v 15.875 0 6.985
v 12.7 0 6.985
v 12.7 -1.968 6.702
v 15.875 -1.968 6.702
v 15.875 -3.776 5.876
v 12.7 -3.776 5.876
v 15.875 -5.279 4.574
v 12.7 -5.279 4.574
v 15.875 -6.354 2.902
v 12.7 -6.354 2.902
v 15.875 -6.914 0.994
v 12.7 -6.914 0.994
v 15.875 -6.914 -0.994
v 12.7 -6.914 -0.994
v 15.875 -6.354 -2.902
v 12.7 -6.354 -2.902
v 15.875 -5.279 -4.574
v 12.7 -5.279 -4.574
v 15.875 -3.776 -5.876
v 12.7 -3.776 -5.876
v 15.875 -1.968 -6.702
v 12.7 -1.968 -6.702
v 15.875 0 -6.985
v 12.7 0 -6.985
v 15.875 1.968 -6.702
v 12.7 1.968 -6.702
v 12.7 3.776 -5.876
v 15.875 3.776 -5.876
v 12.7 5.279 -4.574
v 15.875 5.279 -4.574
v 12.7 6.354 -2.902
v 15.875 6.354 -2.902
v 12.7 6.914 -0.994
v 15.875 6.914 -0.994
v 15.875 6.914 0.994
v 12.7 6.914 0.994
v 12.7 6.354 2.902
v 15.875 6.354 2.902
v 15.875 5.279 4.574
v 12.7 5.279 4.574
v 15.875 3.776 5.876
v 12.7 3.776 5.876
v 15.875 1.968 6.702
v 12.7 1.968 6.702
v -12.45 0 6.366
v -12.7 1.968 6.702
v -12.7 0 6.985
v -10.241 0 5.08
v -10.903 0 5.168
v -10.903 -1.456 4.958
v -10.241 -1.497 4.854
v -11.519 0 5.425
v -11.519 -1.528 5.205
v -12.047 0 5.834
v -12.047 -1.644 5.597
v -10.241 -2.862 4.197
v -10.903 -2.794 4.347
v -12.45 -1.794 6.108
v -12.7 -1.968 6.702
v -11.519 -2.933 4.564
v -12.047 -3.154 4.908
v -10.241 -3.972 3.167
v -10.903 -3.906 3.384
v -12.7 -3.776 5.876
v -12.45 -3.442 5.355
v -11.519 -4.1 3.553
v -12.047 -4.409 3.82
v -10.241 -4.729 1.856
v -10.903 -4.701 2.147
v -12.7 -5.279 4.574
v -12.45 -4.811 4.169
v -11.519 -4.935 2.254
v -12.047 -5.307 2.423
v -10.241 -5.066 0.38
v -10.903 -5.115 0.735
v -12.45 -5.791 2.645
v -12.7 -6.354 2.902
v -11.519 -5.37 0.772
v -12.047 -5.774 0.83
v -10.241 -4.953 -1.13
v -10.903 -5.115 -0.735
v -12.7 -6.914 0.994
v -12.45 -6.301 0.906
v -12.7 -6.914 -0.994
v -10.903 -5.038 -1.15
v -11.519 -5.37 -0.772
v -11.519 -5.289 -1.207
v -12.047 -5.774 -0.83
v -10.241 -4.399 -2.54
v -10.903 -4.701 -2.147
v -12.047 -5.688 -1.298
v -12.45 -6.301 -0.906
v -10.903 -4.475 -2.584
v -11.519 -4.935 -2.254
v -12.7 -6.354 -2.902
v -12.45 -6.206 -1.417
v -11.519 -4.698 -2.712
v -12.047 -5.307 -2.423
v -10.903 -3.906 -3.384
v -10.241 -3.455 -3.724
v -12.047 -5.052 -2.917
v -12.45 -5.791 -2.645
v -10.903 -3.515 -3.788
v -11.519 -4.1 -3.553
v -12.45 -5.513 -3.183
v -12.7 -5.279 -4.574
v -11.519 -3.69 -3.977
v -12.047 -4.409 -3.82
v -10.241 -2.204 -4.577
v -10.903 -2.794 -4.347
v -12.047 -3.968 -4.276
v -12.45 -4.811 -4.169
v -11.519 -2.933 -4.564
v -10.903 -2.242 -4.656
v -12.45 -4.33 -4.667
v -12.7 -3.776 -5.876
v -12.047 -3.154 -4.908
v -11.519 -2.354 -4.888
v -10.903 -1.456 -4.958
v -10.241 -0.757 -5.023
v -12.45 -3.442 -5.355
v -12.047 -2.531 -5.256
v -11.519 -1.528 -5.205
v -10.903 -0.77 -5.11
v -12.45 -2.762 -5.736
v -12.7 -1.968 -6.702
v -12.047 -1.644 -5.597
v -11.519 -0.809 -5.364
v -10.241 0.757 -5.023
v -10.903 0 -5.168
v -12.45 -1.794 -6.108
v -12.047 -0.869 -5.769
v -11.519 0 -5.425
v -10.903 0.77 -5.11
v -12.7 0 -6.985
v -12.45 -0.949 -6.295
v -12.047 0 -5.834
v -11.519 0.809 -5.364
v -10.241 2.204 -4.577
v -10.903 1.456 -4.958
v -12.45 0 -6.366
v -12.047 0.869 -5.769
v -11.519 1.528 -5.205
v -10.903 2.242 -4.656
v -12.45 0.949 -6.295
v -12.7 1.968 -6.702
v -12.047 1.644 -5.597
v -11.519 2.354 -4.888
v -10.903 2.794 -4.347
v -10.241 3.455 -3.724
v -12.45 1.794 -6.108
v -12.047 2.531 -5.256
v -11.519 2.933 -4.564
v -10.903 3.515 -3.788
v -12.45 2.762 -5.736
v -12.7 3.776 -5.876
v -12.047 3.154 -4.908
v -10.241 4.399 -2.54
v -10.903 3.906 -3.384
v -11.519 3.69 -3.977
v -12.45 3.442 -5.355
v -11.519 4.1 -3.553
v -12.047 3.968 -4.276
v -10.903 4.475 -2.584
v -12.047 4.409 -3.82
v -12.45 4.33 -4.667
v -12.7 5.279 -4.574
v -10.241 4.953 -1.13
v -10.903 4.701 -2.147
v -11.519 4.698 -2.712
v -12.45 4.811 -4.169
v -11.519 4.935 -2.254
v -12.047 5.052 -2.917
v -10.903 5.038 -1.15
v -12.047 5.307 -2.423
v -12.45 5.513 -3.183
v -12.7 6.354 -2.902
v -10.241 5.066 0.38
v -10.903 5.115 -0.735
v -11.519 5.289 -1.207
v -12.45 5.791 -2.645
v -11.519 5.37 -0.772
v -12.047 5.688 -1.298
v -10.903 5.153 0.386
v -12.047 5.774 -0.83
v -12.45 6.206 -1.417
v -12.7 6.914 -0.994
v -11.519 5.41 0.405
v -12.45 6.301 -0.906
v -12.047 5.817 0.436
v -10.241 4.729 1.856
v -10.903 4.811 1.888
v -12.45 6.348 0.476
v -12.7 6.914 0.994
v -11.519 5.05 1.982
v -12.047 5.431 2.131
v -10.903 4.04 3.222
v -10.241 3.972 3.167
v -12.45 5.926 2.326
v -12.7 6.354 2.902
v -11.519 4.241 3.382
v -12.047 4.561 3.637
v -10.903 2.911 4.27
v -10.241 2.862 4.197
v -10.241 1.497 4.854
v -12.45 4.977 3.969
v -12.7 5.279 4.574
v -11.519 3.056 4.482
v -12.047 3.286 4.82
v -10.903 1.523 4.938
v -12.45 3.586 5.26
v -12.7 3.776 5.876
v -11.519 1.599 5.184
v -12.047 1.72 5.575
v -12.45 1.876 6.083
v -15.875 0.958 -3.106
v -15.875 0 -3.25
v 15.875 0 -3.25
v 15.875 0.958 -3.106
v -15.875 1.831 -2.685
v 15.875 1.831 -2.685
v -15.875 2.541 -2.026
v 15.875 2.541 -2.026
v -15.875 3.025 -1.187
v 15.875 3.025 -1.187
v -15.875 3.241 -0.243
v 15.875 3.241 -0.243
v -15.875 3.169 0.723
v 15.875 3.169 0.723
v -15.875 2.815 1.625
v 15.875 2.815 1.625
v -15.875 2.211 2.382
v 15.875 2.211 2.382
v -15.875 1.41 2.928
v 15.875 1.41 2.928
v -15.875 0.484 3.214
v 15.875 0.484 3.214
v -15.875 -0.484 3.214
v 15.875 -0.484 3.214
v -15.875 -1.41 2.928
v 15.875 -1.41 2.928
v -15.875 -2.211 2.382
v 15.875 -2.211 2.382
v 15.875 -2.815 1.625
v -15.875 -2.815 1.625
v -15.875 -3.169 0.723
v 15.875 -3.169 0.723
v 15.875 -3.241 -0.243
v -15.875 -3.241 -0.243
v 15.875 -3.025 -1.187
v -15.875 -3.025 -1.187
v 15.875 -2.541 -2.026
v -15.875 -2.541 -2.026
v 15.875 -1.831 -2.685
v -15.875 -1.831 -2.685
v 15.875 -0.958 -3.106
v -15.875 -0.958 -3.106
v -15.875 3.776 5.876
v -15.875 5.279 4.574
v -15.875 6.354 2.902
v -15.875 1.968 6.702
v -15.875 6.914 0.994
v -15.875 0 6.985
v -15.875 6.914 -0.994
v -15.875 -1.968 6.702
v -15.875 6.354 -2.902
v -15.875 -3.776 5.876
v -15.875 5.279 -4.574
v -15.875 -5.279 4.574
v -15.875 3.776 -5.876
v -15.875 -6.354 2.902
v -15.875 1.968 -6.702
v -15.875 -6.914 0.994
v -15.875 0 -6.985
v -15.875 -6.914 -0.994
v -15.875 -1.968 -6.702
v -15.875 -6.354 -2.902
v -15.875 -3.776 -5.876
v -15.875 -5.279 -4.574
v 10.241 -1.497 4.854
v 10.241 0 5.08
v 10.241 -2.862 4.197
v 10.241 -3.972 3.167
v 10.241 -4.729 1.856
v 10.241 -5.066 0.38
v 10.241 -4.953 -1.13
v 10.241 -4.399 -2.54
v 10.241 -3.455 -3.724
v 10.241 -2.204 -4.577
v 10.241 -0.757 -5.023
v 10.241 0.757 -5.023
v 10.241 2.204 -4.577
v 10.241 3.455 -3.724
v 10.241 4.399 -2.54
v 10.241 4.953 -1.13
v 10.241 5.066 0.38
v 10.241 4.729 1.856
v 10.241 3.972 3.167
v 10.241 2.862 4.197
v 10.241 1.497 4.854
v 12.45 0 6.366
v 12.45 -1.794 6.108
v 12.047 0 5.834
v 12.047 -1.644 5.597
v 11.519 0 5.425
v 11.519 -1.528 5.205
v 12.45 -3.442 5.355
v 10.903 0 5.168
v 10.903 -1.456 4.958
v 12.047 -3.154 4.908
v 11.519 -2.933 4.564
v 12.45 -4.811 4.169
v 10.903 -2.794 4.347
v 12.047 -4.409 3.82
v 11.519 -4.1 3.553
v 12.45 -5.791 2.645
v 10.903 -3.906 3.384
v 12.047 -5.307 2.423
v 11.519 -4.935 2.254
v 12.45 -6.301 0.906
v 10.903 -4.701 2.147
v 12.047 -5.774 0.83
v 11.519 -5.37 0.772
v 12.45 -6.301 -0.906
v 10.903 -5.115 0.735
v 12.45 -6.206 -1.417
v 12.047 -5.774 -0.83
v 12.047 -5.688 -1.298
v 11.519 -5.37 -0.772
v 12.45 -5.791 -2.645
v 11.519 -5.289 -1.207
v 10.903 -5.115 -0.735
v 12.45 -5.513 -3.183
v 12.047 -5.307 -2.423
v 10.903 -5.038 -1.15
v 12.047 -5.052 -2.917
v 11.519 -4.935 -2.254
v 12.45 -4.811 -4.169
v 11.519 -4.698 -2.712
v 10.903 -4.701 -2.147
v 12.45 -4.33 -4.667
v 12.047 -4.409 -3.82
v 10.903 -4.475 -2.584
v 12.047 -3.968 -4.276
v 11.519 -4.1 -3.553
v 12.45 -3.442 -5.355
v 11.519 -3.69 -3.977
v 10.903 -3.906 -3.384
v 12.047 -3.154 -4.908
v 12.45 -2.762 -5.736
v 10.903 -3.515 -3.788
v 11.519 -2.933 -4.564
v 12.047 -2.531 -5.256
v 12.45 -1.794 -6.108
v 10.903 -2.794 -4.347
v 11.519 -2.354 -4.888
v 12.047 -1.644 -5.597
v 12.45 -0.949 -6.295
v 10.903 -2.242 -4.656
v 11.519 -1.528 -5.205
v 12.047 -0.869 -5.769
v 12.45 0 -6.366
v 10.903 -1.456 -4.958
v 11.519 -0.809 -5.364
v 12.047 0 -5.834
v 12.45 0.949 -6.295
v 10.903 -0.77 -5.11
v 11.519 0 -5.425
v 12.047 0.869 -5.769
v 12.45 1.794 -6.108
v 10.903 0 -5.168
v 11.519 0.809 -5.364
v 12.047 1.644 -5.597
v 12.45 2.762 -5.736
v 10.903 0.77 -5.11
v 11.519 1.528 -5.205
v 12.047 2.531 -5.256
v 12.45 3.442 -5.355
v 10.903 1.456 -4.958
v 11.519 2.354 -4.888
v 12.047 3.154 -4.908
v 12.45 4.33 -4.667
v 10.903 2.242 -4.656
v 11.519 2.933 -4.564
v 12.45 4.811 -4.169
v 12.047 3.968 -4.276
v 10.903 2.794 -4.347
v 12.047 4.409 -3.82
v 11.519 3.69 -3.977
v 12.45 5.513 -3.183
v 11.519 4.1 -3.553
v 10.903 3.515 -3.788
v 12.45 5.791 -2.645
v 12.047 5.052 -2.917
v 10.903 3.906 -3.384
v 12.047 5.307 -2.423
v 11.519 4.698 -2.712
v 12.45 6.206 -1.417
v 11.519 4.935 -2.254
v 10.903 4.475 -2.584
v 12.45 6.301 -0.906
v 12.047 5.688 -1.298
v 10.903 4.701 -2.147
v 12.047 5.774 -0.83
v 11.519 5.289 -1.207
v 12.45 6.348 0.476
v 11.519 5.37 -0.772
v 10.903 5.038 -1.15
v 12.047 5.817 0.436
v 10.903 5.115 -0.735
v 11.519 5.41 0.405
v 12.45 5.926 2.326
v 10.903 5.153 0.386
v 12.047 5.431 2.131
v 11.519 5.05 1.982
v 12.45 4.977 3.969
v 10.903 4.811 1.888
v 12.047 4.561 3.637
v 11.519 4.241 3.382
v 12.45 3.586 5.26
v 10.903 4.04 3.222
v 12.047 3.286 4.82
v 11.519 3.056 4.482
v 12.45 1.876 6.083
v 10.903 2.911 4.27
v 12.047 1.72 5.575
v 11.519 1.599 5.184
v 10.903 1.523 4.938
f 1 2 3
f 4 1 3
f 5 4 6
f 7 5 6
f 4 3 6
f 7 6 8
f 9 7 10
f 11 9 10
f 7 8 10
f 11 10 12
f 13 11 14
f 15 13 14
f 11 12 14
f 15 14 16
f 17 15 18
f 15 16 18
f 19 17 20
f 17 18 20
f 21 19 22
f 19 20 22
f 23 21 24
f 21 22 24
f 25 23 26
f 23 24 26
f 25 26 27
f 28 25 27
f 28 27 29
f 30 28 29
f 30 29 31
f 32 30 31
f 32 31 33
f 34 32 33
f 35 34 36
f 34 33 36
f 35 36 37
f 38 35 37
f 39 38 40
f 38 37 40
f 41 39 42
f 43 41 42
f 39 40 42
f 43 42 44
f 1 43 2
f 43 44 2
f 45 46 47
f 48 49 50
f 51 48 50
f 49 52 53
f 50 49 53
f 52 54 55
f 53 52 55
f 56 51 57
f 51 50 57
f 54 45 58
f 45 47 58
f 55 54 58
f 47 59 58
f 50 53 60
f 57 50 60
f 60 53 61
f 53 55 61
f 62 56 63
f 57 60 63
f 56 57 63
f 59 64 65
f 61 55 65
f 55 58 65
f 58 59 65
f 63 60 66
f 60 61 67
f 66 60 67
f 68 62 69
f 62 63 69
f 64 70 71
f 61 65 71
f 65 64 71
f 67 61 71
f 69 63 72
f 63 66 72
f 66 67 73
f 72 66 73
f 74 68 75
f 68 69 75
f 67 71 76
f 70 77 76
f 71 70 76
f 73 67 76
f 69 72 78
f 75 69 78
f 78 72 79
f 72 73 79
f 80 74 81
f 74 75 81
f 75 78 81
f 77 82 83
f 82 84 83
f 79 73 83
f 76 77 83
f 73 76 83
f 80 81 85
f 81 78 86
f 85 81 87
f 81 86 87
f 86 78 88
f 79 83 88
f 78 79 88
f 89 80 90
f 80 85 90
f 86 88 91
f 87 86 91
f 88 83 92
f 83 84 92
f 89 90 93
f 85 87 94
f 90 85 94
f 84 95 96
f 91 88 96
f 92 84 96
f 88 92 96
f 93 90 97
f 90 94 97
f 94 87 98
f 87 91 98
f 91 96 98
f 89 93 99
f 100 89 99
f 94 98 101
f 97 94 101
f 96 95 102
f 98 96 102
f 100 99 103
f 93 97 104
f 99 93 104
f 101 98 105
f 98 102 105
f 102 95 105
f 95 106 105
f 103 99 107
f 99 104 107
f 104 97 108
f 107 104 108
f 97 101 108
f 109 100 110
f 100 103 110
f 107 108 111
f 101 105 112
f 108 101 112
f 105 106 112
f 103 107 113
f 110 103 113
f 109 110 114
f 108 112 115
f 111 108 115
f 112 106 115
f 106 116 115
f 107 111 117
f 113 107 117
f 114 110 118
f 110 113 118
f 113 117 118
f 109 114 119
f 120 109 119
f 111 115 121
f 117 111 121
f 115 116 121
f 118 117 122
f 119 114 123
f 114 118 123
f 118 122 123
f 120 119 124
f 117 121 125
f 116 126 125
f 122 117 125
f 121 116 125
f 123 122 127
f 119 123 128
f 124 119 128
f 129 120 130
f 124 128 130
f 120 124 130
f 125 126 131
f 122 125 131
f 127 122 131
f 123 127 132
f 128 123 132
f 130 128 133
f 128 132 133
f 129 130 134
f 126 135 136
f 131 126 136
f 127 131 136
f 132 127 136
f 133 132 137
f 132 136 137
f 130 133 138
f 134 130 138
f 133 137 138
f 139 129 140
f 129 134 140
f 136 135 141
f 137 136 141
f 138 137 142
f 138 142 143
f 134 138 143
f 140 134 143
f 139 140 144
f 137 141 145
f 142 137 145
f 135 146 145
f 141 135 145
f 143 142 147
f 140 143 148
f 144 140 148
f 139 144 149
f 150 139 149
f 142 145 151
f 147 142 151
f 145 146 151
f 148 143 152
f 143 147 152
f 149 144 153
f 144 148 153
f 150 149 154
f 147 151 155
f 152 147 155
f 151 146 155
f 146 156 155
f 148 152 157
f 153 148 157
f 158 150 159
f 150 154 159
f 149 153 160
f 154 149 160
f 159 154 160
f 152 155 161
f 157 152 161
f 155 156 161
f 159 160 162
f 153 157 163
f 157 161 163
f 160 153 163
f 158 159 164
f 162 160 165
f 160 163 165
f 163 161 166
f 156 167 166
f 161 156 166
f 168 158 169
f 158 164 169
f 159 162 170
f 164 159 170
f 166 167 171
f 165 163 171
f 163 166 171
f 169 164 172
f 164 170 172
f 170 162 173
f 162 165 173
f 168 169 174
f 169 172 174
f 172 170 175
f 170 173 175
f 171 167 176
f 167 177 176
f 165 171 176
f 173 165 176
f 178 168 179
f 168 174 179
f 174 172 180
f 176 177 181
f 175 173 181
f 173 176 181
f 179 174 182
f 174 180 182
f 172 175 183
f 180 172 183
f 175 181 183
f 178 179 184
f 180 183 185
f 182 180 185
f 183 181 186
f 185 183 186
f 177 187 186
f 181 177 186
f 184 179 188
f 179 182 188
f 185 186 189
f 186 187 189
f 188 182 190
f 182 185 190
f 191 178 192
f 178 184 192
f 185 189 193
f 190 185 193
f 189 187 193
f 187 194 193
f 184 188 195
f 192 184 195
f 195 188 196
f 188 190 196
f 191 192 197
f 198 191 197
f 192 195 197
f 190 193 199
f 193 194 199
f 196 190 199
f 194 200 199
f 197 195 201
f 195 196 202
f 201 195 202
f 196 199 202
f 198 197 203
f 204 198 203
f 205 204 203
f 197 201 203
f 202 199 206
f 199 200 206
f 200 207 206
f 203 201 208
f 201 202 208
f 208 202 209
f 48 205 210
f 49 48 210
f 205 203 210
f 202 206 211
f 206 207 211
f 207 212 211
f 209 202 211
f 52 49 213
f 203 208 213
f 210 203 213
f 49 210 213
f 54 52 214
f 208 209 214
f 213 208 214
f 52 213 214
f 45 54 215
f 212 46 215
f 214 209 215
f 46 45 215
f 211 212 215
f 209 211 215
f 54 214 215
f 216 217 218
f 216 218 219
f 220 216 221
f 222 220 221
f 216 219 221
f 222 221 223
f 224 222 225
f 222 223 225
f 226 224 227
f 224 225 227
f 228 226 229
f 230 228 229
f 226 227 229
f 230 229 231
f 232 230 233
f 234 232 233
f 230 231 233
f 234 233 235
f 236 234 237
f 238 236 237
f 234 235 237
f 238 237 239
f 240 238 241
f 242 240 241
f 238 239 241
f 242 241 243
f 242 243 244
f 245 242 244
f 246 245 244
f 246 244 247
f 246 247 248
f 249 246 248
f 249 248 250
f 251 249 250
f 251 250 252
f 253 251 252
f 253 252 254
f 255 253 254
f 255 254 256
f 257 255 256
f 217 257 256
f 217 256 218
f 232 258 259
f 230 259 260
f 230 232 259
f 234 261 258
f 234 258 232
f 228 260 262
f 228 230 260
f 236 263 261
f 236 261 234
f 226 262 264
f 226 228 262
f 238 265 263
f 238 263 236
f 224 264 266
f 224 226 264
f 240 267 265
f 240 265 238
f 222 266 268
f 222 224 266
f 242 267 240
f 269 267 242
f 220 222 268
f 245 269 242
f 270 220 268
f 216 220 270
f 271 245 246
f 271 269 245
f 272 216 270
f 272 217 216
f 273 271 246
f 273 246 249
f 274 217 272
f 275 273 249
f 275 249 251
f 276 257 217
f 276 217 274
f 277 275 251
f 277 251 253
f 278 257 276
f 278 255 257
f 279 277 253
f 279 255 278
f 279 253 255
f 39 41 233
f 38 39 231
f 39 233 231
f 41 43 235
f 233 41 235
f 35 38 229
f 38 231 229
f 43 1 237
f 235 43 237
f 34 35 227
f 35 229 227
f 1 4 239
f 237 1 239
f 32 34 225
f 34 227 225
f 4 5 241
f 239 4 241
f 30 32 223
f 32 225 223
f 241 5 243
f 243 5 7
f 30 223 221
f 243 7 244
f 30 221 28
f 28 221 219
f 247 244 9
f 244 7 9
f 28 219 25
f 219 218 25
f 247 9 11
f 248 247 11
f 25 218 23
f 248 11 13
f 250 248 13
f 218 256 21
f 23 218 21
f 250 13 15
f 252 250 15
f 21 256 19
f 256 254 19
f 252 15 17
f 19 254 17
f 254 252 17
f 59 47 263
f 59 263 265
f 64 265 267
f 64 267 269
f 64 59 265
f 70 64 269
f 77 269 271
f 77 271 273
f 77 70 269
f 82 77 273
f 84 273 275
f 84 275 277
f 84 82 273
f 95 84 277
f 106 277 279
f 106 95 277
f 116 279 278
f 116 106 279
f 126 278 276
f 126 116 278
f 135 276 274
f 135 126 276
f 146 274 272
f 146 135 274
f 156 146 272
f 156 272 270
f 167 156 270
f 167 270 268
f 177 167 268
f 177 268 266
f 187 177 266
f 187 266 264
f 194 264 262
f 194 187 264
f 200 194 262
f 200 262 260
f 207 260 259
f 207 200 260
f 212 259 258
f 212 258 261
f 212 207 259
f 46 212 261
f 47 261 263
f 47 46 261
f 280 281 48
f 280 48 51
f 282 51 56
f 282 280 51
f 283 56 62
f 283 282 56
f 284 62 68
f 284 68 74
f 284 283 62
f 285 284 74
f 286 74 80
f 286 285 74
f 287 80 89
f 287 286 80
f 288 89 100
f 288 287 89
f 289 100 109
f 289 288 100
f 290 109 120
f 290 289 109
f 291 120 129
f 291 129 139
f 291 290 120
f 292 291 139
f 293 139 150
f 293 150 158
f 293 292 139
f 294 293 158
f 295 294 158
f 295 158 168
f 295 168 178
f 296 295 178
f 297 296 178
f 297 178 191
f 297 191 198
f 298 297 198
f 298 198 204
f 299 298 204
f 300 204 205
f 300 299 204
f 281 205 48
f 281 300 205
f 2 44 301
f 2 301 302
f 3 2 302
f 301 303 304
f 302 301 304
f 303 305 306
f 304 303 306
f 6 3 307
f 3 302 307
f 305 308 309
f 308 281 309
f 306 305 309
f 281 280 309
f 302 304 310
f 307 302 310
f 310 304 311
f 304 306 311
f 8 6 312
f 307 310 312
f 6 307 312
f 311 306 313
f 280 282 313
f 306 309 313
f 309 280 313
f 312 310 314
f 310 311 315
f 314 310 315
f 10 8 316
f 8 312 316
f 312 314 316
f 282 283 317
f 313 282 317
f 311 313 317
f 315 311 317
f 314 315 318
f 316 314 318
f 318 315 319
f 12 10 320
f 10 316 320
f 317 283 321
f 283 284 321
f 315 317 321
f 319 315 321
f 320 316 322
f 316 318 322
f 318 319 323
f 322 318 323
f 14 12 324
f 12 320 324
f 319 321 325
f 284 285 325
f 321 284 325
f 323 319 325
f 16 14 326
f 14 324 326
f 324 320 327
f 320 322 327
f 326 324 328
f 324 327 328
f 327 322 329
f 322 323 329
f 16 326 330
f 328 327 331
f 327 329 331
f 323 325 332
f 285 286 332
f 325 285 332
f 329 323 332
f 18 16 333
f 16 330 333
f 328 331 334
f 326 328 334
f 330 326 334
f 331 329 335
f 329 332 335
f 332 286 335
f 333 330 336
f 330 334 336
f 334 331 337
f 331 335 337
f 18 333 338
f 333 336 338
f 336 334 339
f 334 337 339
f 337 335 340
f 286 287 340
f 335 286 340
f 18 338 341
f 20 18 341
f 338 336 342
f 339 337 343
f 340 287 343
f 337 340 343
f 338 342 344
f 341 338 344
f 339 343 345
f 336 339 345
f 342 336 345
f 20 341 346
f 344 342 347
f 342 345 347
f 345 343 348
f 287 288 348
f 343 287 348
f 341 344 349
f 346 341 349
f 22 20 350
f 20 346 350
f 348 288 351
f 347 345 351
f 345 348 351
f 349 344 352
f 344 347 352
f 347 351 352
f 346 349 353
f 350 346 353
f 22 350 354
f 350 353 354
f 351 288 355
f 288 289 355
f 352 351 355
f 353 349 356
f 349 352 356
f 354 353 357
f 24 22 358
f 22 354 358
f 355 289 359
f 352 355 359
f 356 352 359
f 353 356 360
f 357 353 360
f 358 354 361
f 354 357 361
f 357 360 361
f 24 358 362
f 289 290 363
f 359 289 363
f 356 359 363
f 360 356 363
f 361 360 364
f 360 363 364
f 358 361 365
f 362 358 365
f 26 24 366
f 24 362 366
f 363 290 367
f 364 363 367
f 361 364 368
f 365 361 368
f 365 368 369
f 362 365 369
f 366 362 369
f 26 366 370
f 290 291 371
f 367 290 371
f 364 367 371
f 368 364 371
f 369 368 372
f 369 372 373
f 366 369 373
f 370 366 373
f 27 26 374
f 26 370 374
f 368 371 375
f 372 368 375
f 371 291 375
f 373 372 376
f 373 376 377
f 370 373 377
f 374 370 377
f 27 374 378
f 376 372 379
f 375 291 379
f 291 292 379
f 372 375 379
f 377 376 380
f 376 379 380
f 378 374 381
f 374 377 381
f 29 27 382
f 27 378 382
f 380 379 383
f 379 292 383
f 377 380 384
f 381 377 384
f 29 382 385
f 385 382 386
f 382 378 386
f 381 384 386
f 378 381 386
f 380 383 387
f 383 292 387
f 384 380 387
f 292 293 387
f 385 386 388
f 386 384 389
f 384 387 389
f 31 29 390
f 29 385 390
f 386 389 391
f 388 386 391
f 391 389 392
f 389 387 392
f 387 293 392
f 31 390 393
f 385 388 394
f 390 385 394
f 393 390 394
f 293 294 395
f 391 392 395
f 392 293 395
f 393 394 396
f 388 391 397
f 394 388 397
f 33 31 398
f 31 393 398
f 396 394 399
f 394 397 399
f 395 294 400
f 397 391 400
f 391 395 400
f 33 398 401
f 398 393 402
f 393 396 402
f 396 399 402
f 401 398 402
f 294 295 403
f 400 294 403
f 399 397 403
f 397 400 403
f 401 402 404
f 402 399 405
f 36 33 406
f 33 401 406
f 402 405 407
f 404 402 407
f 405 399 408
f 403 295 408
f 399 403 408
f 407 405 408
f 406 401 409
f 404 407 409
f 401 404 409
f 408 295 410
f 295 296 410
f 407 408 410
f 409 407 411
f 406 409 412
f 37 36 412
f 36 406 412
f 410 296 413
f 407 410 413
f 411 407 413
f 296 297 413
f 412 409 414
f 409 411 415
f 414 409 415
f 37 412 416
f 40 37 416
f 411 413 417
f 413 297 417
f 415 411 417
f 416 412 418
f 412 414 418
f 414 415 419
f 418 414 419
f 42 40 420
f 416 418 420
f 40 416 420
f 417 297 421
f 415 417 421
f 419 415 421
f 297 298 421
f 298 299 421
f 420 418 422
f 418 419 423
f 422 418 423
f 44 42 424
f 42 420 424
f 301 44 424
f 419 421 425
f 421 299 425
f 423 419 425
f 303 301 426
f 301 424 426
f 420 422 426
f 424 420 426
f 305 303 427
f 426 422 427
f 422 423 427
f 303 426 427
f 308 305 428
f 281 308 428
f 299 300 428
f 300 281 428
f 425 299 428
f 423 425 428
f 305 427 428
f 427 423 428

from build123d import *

# Parameters (mm, degrees)
FILLET1_R          = 2.54
SKETCH2_R          = 3.25
CUT_EXTRUDE1_DEPTH = 34.251209752


with BuildPart() as part:
    # Sketch1 → Revolve1 (revolve)
    with BuildSketch(Plane.XY, mode=Mode.PRIVATE) as revolve1_sk:
        Polygon((15.875, 0), (15.875, 6.985), (12.7, 6.985), (12.7, 5.08), (0, 5.08), (0, 0), align=None)
    revolve1 = revolve(revolve1_sk.sketch.rotate(Axis((0, 0, 0), (1, 0, 0)), 90), axis=Axis((0, 0, 0), (1, 0, 0)))

    # Mirror1: Revolve1 across plane
    add(revolve1.mirror(Plane(origin=(0, 0, 0), x_dir=(0, 0, 1), z_dir=(1, 0, 0))))

    # Fillet1
    # the kernel refuses this fillet: 2.54 mm, written as the material it adds along each edge
    with BuildSketch(Plane(origin=(-12.7, 0, 0), x_dir=(0, 0, 1), z_dir=(0, 1, 0))) as fillet1_piece_1:
        with BuildLine():
            CenterArc((7.62, 2.459344425), FILLET1_R, 180, 75.522487814)
            Line((6.985, 0), (6.9723, -0.049186888))
            ThreePointArc((6.9723, -0.049186888), (6.0325, -0.0508), (5.08, -0.0508))
            Line((5.08, -0.0508), (5.0292, 0))
            Line((5.0292, 0), (5.0292, 2.459344425))
            Line((5.0292, 2.459344425), (5.08, 2.459344425))
        make_face()
    revolve(axis=Axis((-12.7, 0, 0), (1, 0, 0)))
    with BuildSketch(Plane(origin=(12.7, 0, 0), x_dir=(0, 0, 1), z_dir=(0, 1, 0))) as fillet1_piece_2:
        with BuildLine():
            CenterArc((7.62, -2.459344425), FILLET1_R, 104.477512186, 75.522487814)
            Line((5.08, -2.459344425), (5.0292, -2.459344425))
            Line((5.0292, -2.459344425), (5.0292, 0))
            Line((5.0292, 0), (5.08, 0.0508))
            ThreePointArc((5.08, 0.0508), (6.0325, 0.0508), (6.9723, 0.049186888))
            Line((6.9723, 0.049186888), (6.985, 0))
        make_face()
    revolve(axis=Axis((12.7, 0, 0), (1, 0, 0)))

    # Sketch2 → Cut-Extrude1 (cut, through all)
    with BuildSketch(Plane(origin=(15.875, 0, 0), x_dir=(0, 0, -1), z_dir=(1, 0, 0))):
        Circle(SKETCH2_R)
    extrude(amount=-CUT_EXTRUDE1_DEPTH, mode=Mode.SUBTRACT)


solid = part.part
